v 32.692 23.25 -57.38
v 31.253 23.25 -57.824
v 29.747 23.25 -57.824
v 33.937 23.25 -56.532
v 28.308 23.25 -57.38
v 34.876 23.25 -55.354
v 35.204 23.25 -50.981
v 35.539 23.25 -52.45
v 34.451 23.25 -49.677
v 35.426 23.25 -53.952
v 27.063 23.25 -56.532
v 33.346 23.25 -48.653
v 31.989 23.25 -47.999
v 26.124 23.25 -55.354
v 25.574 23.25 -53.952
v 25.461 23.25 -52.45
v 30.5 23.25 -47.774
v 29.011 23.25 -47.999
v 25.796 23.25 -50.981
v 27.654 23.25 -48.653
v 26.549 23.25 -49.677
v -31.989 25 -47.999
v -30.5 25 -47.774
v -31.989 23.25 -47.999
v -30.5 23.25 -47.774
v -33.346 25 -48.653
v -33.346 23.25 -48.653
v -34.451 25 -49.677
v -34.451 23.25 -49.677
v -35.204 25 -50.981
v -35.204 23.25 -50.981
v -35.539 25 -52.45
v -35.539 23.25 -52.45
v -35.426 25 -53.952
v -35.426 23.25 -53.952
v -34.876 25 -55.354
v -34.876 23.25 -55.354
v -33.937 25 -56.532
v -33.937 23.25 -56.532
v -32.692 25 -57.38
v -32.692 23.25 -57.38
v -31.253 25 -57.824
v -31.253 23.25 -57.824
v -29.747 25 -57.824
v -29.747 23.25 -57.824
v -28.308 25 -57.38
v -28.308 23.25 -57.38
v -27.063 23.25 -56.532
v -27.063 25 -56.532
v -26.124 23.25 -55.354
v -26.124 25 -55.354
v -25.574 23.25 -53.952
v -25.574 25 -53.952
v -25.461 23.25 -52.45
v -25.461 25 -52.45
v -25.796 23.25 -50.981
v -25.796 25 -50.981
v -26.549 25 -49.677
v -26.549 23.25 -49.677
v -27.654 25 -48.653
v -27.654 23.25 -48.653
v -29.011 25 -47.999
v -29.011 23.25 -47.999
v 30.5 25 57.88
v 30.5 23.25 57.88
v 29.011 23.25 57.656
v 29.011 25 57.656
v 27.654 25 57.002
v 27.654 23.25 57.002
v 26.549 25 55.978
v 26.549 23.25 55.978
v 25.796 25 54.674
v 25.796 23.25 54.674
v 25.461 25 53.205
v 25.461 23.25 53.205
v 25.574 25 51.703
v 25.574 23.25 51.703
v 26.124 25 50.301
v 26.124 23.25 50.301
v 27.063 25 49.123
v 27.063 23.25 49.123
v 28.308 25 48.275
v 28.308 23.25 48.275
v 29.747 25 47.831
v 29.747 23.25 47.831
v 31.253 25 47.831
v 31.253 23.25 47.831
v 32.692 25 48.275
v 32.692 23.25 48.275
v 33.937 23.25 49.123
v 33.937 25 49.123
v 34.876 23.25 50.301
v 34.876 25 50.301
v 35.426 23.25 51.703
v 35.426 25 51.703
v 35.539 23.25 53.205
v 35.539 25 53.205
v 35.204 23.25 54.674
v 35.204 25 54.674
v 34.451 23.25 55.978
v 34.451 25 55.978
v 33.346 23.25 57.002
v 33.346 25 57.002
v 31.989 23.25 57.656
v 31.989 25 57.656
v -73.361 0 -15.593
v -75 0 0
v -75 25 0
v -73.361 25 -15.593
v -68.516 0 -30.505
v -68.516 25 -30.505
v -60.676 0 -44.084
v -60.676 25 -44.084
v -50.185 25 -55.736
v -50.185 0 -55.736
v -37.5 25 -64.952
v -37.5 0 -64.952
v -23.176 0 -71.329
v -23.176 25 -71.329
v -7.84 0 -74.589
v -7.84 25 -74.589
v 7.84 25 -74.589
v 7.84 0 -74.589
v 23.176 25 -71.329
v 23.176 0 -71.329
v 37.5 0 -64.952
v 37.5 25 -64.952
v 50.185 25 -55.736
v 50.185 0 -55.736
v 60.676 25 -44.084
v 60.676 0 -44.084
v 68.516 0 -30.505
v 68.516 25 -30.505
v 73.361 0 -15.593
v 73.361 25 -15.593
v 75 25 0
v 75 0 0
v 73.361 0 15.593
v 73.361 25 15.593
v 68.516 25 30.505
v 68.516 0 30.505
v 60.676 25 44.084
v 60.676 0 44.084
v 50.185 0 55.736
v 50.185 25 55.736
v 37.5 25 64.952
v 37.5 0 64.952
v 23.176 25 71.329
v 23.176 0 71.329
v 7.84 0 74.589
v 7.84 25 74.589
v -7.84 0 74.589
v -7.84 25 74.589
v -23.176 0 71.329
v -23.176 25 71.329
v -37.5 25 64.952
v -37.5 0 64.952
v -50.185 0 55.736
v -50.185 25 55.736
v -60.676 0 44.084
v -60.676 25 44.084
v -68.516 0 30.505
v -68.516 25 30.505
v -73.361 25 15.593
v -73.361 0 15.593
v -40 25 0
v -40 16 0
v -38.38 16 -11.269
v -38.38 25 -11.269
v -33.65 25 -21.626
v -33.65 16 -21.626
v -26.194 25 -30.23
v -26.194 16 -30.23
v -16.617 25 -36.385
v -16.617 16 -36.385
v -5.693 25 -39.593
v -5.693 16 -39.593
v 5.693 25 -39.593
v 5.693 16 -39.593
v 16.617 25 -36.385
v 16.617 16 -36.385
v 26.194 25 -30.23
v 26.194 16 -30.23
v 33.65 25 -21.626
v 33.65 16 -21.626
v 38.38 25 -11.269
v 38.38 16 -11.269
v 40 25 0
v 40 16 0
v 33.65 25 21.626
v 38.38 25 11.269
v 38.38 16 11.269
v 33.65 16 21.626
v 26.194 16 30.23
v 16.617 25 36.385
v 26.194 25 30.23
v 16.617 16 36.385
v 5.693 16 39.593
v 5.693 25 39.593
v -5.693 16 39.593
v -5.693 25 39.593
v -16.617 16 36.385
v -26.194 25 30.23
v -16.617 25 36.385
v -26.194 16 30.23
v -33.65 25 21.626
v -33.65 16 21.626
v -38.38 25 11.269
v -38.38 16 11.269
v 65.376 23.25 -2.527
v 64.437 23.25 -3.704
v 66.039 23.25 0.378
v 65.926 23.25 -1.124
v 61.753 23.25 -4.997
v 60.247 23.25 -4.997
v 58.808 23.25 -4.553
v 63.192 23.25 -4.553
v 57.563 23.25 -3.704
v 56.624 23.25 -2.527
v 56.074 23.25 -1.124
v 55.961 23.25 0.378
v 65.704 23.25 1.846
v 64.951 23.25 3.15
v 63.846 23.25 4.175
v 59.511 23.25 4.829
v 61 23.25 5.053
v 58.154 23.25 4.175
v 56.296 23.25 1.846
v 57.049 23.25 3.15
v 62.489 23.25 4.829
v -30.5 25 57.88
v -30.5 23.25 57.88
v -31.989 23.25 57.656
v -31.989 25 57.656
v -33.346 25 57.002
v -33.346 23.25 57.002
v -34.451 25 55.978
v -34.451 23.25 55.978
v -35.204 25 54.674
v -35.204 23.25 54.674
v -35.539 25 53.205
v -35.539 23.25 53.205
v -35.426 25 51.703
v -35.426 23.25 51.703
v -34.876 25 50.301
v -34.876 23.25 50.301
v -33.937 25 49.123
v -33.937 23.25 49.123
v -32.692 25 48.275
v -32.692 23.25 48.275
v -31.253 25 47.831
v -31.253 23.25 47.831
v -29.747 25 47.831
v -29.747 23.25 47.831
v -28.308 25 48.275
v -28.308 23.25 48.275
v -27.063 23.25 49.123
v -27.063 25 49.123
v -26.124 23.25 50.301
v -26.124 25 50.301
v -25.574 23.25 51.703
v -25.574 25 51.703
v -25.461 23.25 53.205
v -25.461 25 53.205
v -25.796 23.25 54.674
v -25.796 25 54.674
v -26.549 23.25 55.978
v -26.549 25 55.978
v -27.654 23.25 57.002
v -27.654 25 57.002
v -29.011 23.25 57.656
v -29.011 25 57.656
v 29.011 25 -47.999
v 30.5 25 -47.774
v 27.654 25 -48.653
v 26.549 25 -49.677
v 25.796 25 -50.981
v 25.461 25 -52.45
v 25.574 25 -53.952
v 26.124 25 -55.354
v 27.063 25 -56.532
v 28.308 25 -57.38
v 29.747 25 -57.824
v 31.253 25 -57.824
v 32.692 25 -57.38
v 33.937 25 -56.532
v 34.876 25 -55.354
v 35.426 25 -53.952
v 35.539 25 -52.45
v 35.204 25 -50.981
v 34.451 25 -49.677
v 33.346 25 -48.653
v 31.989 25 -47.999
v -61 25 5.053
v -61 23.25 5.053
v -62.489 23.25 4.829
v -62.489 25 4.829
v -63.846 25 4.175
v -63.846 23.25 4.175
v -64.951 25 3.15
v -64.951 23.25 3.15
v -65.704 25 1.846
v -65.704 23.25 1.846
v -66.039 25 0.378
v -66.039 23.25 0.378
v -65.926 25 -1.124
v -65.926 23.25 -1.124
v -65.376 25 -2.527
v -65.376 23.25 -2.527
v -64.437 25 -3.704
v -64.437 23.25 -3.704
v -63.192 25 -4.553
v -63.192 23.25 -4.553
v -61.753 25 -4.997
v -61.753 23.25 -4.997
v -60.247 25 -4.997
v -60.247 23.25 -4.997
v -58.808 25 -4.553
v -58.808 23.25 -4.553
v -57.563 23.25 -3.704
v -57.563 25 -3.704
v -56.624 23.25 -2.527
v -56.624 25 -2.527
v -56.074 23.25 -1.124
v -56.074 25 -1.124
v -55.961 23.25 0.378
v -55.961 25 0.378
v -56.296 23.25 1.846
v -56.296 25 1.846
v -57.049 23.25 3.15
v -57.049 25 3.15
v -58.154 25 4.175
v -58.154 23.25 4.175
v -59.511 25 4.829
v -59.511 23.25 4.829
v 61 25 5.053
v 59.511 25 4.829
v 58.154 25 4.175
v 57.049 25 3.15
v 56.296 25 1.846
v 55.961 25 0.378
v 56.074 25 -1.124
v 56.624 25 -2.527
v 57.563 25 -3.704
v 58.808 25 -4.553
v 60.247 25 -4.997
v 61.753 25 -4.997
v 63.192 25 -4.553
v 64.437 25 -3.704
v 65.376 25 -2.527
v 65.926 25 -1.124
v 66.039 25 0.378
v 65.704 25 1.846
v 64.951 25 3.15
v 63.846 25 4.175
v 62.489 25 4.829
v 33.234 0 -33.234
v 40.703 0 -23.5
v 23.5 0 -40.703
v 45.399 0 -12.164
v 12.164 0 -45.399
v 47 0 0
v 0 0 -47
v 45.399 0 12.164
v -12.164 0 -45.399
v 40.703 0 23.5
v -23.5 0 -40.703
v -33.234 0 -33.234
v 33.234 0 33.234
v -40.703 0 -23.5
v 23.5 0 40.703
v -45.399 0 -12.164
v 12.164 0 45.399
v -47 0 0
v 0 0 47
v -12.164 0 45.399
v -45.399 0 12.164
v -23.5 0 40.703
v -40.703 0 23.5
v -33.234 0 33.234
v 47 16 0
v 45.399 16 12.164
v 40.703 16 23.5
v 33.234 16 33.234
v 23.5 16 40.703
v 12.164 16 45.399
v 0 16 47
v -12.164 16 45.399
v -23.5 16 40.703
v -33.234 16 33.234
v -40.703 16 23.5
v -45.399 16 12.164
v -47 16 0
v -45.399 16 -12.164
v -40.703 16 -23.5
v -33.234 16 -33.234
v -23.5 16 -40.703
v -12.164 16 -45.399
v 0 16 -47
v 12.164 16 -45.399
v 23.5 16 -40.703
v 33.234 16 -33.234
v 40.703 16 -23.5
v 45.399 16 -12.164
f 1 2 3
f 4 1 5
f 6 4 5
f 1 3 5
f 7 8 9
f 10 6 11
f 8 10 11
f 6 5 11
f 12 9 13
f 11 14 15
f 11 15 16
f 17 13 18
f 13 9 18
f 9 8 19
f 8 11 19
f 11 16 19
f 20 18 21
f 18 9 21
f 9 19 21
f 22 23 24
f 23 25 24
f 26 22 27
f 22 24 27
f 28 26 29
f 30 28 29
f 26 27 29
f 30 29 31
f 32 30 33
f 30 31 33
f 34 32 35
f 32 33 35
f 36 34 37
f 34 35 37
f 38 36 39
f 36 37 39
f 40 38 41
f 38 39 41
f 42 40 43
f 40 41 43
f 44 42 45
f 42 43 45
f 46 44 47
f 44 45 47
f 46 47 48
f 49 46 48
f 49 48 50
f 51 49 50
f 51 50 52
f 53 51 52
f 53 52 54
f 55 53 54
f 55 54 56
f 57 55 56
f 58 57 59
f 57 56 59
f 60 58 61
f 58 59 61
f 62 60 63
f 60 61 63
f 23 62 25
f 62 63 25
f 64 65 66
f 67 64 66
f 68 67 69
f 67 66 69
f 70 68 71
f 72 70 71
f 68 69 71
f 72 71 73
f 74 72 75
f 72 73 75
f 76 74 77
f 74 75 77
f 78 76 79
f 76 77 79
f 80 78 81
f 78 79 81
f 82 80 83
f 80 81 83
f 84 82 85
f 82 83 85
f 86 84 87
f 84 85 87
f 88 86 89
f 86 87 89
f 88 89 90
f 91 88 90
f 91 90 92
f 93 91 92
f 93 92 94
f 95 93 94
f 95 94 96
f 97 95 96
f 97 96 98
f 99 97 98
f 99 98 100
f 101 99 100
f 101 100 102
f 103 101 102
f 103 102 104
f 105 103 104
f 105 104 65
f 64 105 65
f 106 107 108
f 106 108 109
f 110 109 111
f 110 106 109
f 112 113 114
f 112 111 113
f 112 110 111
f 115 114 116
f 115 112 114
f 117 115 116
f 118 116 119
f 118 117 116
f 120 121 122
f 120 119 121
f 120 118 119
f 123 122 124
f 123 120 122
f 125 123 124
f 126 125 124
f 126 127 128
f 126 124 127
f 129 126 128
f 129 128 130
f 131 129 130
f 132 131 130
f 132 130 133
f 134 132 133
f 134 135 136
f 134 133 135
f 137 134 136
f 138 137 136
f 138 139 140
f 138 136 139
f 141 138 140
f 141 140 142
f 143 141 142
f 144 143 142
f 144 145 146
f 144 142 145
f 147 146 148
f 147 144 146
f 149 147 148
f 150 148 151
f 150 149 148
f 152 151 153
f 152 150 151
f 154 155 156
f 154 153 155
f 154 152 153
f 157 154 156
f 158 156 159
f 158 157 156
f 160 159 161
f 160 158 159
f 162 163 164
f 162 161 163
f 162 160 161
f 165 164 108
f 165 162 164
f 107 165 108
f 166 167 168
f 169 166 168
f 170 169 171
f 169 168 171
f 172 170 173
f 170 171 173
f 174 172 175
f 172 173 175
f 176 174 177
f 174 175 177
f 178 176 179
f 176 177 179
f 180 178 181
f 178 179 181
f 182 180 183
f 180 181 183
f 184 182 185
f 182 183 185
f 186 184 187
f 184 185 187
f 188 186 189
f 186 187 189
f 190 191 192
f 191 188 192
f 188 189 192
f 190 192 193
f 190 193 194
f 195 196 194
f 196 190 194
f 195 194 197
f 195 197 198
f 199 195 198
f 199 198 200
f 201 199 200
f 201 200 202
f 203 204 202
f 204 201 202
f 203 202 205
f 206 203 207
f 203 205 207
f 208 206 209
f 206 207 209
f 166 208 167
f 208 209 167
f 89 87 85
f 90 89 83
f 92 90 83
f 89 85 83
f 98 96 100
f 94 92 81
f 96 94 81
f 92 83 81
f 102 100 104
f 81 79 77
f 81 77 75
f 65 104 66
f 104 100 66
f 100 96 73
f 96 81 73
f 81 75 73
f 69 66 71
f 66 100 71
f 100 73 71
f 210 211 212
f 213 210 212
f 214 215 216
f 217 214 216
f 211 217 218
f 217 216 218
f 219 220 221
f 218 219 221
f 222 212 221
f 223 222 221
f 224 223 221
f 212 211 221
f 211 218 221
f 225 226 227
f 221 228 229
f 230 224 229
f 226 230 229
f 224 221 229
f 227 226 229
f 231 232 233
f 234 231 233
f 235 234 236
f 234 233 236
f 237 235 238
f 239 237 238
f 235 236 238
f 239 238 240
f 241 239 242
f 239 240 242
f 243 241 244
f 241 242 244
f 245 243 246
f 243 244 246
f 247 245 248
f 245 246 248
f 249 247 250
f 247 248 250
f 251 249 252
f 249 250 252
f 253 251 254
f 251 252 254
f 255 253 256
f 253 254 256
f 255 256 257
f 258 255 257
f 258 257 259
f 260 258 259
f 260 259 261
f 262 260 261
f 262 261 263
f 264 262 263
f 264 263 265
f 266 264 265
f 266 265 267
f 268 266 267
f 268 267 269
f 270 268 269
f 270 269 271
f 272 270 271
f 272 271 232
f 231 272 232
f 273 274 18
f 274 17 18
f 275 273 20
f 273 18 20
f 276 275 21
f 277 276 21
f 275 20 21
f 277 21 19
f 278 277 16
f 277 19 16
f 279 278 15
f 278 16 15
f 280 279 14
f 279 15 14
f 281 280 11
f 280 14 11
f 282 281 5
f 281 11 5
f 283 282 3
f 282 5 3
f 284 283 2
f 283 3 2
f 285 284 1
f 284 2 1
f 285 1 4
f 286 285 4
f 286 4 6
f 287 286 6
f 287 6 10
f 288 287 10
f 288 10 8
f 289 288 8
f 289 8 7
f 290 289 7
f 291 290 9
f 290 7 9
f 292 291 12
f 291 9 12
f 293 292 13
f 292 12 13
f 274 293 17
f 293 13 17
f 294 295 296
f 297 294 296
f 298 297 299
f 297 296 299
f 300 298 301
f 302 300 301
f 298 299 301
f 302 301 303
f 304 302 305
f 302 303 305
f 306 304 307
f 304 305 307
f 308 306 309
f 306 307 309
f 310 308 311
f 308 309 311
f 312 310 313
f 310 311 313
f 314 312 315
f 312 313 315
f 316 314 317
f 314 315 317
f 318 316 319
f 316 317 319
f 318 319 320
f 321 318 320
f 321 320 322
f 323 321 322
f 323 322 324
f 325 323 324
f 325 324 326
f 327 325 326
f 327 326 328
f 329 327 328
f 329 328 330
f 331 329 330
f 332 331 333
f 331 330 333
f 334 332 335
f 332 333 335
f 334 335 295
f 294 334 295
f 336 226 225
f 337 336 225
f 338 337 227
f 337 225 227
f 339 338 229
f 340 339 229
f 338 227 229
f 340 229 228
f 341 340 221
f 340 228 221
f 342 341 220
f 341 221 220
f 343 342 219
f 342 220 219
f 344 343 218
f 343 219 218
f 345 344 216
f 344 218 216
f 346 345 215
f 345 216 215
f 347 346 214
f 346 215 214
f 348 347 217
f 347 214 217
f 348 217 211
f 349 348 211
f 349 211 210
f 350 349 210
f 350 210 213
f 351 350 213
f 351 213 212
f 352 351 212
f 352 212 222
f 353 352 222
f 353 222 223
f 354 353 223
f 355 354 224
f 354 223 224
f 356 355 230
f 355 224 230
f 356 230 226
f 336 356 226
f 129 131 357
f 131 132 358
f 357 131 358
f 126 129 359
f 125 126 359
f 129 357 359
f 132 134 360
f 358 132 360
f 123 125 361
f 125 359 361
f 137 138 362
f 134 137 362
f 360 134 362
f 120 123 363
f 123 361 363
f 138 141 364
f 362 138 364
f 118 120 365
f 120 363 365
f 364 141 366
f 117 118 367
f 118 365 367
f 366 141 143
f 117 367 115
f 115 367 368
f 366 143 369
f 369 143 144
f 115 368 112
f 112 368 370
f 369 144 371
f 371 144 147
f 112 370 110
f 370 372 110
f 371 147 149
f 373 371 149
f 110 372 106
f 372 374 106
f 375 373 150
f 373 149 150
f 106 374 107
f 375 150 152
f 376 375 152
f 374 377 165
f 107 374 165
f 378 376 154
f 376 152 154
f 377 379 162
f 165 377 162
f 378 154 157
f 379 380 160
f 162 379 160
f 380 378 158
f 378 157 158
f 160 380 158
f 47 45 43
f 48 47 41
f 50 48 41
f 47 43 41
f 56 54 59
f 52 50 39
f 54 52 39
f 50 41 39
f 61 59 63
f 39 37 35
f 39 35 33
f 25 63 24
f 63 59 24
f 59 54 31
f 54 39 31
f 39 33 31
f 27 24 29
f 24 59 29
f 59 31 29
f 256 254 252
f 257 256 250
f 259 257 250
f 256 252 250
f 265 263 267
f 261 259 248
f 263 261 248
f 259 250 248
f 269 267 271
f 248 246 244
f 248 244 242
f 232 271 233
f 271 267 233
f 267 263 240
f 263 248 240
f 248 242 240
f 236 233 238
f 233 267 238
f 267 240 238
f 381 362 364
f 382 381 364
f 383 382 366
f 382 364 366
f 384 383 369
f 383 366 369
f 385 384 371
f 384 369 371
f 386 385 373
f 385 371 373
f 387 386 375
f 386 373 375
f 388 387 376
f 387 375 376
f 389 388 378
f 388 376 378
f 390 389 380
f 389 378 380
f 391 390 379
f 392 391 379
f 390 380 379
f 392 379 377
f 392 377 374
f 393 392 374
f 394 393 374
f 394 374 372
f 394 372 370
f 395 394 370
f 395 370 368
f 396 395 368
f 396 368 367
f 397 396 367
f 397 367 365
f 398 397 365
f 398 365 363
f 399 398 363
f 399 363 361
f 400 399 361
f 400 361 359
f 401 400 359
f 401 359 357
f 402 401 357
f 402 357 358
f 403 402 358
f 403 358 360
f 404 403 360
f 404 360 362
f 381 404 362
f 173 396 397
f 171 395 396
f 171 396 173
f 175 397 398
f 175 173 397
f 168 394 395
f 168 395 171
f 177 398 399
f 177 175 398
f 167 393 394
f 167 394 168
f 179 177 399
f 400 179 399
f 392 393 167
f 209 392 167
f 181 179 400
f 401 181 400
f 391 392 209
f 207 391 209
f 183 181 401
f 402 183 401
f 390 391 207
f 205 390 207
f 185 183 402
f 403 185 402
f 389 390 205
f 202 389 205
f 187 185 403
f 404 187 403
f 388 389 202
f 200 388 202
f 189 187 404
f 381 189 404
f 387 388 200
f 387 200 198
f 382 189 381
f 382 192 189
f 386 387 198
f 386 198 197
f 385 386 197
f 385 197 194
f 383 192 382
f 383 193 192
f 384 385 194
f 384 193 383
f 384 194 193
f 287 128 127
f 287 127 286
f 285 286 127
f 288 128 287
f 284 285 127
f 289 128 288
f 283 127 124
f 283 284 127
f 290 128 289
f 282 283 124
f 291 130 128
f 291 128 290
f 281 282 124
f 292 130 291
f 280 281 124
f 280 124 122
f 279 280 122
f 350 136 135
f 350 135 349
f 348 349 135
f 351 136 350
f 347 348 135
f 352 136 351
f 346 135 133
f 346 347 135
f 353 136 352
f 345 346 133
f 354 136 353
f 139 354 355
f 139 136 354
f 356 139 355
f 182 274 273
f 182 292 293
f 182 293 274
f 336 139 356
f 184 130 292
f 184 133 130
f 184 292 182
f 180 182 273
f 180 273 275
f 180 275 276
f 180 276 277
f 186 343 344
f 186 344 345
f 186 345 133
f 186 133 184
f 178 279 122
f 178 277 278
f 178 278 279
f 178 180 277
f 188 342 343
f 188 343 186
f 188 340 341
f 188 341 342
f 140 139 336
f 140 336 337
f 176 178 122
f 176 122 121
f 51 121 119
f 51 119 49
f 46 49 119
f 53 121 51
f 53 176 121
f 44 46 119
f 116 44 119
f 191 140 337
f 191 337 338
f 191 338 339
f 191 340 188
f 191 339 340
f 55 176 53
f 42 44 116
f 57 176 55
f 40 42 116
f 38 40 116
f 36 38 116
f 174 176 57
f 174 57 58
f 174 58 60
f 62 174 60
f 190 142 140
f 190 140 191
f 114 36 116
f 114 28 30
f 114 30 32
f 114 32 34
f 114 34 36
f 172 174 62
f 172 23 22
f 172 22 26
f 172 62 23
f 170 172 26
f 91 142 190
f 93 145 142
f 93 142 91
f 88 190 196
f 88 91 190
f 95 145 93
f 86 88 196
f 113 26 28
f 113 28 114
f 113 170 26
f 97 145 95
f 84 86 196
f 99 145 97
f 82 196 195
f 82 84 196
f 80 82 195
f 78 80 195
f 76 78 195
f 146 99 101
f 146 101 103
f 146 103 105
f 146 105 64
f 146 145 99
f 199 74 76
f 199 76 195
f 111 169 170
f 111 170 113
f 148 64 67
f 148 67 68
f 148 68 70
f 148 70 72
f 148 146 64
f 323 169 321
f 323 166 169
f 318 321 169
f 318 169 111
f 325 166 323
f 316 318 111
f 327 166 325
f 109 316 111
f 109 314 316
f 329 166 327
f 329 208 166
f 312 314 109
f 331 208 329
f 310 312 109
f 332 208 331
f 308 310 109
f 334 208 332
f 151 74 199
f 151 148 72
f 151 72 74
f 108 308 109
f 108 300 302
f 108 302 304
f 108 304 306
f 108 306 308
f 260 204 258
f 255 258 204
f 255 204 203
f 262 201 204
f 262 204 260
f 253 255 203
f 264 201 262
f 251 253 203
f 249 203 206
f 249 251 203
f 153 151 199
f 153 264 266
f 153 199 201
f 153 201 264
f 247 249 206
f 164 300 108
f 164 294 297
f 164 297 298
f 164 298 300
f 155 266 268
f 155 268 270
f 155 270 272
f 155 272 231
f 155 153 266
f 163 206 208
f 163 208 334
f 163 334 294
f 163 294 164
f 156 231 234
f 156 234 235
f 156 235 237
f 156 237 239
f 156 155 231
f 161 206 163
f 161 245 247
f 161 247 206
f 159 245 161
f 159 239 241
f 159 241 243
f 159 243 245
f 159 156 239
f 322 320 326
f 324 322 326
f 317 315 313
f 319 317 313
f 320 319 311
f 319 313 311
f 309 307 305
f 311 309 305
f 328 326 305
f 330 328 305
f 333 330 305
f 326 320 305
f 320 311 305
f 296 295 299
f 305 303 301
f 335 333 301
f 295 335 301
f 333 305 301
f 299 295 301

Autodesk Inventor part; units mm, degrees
ref_plane "YZ Plane" through (0, 0, 0) normal (1, 0, 0) x (0, 1, 0)
ref_plane "XZ Plane" through (0, 0, 0) normal (0, 1, 0) x (-1, 0, 0)
ref_plane "XY Plane" through (0, 0, 0) normal (0, 0, 1) x (1, 0, 0)
sketch "Boceto1" plane through (0, 0, 0) normal (0, 1, 0) x (-1, 0, 0)
  circle A0 centre (0, 0) radius 75
  circle A1 centre (0, 0) radius 40
  dimension "d0" = 150
  dimension "d1" = 80
extrude "Extrusión1" add sketch "Boceto1" along normal blind 25
sketch "Boceto2" plane through (0, 0, 0) normal (0, -1, 0) x (1, 0, 0)
  circle A0 centre (0, 0) radius 47
  dimension "d4" = 94
extrude "Extrusión2" cut sketch "Boceto2" against normal blind 16
sketch "Boceto3" plane through (0, 25, 0) normal (0, 1, 0) x (1, 0, 0)
  circle A0 centre (0, 0) radius 61
  line L0 (0, 0) -> (61, 0) construction
  point P0 (30.5, 52.8275)
  point P1 (-30.5, 52.8275)
  point P2 (-61, 0)
  point P3 (-30.5, -52.8275)
  point P4 (30.5, -52.8275)
  dimension "d7" = 122
  dimension "d10" = 360
hole "Agujero1" at (61, 25, 0) at (30.5, 25, -52.8275) at (-30.5, 25, -52.8275) at (-61, 25, 0) at (-30.5, 25, 52.8275) at (30.5, 25, 52.8275) direction (0, -1, 0) diameter 10.106 depth 1.75 thread size "M12x1.75" class "6H" standard "ISO Metric profile"
properties part number "9_AnilloComplementarioA"
